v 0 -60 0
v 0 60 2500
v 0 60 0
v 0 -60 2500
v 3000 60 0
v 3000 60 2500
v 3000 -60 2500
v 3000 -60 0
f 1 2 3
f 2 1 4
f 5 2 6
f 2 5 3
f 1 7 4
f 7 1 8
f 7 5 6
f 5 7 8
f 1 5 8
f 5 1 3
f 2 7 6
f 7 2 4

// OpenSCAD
// Archiyou -> OpenSCAD  |  script: timberwall  |  units: mm
// OpenSCAD has no units: coordinates are in mm.
// Parts: 13 CSG, 0 baked, 0 2D
// Parameters at export, for reference only (nothing in this file is linked to them):
//   WIDTH = 3000
//   HEIGHT = 2500
//   DEPTH = "120"
//   OPENING = false
//   OPENING_START = 1000
//   OPENING_SILL = 1000
//   OPENING_WIDTH = 1000
//   OPENING_HEIGHT = 1000
//   BOARDS = "none"
//   INSULATION = "hempflax"
//   TOP_CONNECT = false

$fn = 32;
PART = "";

// stud0  (layer wall/studs)
module stud0() {
    color([0, 0.502, 0]) translate([19, 0, 1250]) cube([38, 120, 2424], center = true);
}

// stud1  (layer wall/studs)
module stud1() {
    color([0, 0.502, 0]) translate([610, 0, 1250]) cube([38, 120, 2424], center = true);
}

// stud2  (layer wall/studs)
module stud2() {
    color([0, 0.502, 0]) translate([1220, 0, 1250]) cube([38, 120, 2424], center = true);
}

// stud3  (layer wall/studs)
module stud3() {
    color([0, 0.502, 0]) translate([1830, 0, 1250]) cube([38, 120, 2424], center = true);
}

// stud4  (layer wall/studs)
module stud4() {
    color([0, 0.502, 0]) translate([2440, 0, 1250]) cube([38, 120, 2424], center = true);
}

// endstud  (layer wall/studs)
module endstud() {
    color([0, 0.502, 0]) translate([2981, 0, 1250]) cube([38, 120, 2424], center = true);
}

// bottomplate  (layer wall/plates)
module bottomplate() {
    color([0, 0.502, 0]) translate([1500, 0, 19]) cube([3000, 120, 38], center = true);
}

// topplate  (layer wall/plates)
module topplate() {
    color([0, 0.502, 0]) translate([1500, 0, 2481]) cube([3000, 120, 38], center = true);
}

// insulation0  (layer wall/insulation)
module insulation0() {
    color([0.133, 0.133, 0.133]) translate([314.5, 0, 1250]) cube([553, 120, 2424], center = true);
}

// insulation1  (layer wall/insulation)
module insulation1() {
    color([0.133, 0.133, 0.133]) translate([915, 0, 1250]) cube([572, 120, 2424], center = true);
}

// insulation2  (layer wall/insulation)
module insulation2() {
    color([0.133, 0.133, 0.133]) translate([1525, 0, 1250]) cube([572, 120, 2424], center = true);
}

// insulation3  (layer wall/insulation)
module insulation3() {
    color([0.133, 0.133, 0.133]) translate([2135, 0, 1250]) cube([572, 120, 2424], center = true);
}

// insulation4  (layer wall/insulation)
module insulation4() {
    color([0.133, 0.133, 0.133]) translate([2710.5, 0, 1250]) cube([503, 120, 2424], center = true);
}

// 3D parts
if (PART == "" || PART == "stud0") stud0();
if (PART == "" || PART == "stud1") stud1();
if (PART == "" || PART == "stud2") stud2();
if (PART == "" || PART == "stud3") stud3();
if (PART == "" || PART == "stud4") stud4();
if (PART == "" || PART == "endstud") endstud();
if (PART == "" || PART == "bottomplate") bottomplate();
if (PART == "" || PART == "topplate") topplate();
if (PART == "" || PART == "insulation0") insulation0();
if (PART == "" || PART == "insulation1") insulation1();
if (PART == "" || PART == "insulation2") insulation2();
if (PART == "" || PART == "insulation3") insulation3();
if (PART == "" || PART == "insulation4") insulation4();
